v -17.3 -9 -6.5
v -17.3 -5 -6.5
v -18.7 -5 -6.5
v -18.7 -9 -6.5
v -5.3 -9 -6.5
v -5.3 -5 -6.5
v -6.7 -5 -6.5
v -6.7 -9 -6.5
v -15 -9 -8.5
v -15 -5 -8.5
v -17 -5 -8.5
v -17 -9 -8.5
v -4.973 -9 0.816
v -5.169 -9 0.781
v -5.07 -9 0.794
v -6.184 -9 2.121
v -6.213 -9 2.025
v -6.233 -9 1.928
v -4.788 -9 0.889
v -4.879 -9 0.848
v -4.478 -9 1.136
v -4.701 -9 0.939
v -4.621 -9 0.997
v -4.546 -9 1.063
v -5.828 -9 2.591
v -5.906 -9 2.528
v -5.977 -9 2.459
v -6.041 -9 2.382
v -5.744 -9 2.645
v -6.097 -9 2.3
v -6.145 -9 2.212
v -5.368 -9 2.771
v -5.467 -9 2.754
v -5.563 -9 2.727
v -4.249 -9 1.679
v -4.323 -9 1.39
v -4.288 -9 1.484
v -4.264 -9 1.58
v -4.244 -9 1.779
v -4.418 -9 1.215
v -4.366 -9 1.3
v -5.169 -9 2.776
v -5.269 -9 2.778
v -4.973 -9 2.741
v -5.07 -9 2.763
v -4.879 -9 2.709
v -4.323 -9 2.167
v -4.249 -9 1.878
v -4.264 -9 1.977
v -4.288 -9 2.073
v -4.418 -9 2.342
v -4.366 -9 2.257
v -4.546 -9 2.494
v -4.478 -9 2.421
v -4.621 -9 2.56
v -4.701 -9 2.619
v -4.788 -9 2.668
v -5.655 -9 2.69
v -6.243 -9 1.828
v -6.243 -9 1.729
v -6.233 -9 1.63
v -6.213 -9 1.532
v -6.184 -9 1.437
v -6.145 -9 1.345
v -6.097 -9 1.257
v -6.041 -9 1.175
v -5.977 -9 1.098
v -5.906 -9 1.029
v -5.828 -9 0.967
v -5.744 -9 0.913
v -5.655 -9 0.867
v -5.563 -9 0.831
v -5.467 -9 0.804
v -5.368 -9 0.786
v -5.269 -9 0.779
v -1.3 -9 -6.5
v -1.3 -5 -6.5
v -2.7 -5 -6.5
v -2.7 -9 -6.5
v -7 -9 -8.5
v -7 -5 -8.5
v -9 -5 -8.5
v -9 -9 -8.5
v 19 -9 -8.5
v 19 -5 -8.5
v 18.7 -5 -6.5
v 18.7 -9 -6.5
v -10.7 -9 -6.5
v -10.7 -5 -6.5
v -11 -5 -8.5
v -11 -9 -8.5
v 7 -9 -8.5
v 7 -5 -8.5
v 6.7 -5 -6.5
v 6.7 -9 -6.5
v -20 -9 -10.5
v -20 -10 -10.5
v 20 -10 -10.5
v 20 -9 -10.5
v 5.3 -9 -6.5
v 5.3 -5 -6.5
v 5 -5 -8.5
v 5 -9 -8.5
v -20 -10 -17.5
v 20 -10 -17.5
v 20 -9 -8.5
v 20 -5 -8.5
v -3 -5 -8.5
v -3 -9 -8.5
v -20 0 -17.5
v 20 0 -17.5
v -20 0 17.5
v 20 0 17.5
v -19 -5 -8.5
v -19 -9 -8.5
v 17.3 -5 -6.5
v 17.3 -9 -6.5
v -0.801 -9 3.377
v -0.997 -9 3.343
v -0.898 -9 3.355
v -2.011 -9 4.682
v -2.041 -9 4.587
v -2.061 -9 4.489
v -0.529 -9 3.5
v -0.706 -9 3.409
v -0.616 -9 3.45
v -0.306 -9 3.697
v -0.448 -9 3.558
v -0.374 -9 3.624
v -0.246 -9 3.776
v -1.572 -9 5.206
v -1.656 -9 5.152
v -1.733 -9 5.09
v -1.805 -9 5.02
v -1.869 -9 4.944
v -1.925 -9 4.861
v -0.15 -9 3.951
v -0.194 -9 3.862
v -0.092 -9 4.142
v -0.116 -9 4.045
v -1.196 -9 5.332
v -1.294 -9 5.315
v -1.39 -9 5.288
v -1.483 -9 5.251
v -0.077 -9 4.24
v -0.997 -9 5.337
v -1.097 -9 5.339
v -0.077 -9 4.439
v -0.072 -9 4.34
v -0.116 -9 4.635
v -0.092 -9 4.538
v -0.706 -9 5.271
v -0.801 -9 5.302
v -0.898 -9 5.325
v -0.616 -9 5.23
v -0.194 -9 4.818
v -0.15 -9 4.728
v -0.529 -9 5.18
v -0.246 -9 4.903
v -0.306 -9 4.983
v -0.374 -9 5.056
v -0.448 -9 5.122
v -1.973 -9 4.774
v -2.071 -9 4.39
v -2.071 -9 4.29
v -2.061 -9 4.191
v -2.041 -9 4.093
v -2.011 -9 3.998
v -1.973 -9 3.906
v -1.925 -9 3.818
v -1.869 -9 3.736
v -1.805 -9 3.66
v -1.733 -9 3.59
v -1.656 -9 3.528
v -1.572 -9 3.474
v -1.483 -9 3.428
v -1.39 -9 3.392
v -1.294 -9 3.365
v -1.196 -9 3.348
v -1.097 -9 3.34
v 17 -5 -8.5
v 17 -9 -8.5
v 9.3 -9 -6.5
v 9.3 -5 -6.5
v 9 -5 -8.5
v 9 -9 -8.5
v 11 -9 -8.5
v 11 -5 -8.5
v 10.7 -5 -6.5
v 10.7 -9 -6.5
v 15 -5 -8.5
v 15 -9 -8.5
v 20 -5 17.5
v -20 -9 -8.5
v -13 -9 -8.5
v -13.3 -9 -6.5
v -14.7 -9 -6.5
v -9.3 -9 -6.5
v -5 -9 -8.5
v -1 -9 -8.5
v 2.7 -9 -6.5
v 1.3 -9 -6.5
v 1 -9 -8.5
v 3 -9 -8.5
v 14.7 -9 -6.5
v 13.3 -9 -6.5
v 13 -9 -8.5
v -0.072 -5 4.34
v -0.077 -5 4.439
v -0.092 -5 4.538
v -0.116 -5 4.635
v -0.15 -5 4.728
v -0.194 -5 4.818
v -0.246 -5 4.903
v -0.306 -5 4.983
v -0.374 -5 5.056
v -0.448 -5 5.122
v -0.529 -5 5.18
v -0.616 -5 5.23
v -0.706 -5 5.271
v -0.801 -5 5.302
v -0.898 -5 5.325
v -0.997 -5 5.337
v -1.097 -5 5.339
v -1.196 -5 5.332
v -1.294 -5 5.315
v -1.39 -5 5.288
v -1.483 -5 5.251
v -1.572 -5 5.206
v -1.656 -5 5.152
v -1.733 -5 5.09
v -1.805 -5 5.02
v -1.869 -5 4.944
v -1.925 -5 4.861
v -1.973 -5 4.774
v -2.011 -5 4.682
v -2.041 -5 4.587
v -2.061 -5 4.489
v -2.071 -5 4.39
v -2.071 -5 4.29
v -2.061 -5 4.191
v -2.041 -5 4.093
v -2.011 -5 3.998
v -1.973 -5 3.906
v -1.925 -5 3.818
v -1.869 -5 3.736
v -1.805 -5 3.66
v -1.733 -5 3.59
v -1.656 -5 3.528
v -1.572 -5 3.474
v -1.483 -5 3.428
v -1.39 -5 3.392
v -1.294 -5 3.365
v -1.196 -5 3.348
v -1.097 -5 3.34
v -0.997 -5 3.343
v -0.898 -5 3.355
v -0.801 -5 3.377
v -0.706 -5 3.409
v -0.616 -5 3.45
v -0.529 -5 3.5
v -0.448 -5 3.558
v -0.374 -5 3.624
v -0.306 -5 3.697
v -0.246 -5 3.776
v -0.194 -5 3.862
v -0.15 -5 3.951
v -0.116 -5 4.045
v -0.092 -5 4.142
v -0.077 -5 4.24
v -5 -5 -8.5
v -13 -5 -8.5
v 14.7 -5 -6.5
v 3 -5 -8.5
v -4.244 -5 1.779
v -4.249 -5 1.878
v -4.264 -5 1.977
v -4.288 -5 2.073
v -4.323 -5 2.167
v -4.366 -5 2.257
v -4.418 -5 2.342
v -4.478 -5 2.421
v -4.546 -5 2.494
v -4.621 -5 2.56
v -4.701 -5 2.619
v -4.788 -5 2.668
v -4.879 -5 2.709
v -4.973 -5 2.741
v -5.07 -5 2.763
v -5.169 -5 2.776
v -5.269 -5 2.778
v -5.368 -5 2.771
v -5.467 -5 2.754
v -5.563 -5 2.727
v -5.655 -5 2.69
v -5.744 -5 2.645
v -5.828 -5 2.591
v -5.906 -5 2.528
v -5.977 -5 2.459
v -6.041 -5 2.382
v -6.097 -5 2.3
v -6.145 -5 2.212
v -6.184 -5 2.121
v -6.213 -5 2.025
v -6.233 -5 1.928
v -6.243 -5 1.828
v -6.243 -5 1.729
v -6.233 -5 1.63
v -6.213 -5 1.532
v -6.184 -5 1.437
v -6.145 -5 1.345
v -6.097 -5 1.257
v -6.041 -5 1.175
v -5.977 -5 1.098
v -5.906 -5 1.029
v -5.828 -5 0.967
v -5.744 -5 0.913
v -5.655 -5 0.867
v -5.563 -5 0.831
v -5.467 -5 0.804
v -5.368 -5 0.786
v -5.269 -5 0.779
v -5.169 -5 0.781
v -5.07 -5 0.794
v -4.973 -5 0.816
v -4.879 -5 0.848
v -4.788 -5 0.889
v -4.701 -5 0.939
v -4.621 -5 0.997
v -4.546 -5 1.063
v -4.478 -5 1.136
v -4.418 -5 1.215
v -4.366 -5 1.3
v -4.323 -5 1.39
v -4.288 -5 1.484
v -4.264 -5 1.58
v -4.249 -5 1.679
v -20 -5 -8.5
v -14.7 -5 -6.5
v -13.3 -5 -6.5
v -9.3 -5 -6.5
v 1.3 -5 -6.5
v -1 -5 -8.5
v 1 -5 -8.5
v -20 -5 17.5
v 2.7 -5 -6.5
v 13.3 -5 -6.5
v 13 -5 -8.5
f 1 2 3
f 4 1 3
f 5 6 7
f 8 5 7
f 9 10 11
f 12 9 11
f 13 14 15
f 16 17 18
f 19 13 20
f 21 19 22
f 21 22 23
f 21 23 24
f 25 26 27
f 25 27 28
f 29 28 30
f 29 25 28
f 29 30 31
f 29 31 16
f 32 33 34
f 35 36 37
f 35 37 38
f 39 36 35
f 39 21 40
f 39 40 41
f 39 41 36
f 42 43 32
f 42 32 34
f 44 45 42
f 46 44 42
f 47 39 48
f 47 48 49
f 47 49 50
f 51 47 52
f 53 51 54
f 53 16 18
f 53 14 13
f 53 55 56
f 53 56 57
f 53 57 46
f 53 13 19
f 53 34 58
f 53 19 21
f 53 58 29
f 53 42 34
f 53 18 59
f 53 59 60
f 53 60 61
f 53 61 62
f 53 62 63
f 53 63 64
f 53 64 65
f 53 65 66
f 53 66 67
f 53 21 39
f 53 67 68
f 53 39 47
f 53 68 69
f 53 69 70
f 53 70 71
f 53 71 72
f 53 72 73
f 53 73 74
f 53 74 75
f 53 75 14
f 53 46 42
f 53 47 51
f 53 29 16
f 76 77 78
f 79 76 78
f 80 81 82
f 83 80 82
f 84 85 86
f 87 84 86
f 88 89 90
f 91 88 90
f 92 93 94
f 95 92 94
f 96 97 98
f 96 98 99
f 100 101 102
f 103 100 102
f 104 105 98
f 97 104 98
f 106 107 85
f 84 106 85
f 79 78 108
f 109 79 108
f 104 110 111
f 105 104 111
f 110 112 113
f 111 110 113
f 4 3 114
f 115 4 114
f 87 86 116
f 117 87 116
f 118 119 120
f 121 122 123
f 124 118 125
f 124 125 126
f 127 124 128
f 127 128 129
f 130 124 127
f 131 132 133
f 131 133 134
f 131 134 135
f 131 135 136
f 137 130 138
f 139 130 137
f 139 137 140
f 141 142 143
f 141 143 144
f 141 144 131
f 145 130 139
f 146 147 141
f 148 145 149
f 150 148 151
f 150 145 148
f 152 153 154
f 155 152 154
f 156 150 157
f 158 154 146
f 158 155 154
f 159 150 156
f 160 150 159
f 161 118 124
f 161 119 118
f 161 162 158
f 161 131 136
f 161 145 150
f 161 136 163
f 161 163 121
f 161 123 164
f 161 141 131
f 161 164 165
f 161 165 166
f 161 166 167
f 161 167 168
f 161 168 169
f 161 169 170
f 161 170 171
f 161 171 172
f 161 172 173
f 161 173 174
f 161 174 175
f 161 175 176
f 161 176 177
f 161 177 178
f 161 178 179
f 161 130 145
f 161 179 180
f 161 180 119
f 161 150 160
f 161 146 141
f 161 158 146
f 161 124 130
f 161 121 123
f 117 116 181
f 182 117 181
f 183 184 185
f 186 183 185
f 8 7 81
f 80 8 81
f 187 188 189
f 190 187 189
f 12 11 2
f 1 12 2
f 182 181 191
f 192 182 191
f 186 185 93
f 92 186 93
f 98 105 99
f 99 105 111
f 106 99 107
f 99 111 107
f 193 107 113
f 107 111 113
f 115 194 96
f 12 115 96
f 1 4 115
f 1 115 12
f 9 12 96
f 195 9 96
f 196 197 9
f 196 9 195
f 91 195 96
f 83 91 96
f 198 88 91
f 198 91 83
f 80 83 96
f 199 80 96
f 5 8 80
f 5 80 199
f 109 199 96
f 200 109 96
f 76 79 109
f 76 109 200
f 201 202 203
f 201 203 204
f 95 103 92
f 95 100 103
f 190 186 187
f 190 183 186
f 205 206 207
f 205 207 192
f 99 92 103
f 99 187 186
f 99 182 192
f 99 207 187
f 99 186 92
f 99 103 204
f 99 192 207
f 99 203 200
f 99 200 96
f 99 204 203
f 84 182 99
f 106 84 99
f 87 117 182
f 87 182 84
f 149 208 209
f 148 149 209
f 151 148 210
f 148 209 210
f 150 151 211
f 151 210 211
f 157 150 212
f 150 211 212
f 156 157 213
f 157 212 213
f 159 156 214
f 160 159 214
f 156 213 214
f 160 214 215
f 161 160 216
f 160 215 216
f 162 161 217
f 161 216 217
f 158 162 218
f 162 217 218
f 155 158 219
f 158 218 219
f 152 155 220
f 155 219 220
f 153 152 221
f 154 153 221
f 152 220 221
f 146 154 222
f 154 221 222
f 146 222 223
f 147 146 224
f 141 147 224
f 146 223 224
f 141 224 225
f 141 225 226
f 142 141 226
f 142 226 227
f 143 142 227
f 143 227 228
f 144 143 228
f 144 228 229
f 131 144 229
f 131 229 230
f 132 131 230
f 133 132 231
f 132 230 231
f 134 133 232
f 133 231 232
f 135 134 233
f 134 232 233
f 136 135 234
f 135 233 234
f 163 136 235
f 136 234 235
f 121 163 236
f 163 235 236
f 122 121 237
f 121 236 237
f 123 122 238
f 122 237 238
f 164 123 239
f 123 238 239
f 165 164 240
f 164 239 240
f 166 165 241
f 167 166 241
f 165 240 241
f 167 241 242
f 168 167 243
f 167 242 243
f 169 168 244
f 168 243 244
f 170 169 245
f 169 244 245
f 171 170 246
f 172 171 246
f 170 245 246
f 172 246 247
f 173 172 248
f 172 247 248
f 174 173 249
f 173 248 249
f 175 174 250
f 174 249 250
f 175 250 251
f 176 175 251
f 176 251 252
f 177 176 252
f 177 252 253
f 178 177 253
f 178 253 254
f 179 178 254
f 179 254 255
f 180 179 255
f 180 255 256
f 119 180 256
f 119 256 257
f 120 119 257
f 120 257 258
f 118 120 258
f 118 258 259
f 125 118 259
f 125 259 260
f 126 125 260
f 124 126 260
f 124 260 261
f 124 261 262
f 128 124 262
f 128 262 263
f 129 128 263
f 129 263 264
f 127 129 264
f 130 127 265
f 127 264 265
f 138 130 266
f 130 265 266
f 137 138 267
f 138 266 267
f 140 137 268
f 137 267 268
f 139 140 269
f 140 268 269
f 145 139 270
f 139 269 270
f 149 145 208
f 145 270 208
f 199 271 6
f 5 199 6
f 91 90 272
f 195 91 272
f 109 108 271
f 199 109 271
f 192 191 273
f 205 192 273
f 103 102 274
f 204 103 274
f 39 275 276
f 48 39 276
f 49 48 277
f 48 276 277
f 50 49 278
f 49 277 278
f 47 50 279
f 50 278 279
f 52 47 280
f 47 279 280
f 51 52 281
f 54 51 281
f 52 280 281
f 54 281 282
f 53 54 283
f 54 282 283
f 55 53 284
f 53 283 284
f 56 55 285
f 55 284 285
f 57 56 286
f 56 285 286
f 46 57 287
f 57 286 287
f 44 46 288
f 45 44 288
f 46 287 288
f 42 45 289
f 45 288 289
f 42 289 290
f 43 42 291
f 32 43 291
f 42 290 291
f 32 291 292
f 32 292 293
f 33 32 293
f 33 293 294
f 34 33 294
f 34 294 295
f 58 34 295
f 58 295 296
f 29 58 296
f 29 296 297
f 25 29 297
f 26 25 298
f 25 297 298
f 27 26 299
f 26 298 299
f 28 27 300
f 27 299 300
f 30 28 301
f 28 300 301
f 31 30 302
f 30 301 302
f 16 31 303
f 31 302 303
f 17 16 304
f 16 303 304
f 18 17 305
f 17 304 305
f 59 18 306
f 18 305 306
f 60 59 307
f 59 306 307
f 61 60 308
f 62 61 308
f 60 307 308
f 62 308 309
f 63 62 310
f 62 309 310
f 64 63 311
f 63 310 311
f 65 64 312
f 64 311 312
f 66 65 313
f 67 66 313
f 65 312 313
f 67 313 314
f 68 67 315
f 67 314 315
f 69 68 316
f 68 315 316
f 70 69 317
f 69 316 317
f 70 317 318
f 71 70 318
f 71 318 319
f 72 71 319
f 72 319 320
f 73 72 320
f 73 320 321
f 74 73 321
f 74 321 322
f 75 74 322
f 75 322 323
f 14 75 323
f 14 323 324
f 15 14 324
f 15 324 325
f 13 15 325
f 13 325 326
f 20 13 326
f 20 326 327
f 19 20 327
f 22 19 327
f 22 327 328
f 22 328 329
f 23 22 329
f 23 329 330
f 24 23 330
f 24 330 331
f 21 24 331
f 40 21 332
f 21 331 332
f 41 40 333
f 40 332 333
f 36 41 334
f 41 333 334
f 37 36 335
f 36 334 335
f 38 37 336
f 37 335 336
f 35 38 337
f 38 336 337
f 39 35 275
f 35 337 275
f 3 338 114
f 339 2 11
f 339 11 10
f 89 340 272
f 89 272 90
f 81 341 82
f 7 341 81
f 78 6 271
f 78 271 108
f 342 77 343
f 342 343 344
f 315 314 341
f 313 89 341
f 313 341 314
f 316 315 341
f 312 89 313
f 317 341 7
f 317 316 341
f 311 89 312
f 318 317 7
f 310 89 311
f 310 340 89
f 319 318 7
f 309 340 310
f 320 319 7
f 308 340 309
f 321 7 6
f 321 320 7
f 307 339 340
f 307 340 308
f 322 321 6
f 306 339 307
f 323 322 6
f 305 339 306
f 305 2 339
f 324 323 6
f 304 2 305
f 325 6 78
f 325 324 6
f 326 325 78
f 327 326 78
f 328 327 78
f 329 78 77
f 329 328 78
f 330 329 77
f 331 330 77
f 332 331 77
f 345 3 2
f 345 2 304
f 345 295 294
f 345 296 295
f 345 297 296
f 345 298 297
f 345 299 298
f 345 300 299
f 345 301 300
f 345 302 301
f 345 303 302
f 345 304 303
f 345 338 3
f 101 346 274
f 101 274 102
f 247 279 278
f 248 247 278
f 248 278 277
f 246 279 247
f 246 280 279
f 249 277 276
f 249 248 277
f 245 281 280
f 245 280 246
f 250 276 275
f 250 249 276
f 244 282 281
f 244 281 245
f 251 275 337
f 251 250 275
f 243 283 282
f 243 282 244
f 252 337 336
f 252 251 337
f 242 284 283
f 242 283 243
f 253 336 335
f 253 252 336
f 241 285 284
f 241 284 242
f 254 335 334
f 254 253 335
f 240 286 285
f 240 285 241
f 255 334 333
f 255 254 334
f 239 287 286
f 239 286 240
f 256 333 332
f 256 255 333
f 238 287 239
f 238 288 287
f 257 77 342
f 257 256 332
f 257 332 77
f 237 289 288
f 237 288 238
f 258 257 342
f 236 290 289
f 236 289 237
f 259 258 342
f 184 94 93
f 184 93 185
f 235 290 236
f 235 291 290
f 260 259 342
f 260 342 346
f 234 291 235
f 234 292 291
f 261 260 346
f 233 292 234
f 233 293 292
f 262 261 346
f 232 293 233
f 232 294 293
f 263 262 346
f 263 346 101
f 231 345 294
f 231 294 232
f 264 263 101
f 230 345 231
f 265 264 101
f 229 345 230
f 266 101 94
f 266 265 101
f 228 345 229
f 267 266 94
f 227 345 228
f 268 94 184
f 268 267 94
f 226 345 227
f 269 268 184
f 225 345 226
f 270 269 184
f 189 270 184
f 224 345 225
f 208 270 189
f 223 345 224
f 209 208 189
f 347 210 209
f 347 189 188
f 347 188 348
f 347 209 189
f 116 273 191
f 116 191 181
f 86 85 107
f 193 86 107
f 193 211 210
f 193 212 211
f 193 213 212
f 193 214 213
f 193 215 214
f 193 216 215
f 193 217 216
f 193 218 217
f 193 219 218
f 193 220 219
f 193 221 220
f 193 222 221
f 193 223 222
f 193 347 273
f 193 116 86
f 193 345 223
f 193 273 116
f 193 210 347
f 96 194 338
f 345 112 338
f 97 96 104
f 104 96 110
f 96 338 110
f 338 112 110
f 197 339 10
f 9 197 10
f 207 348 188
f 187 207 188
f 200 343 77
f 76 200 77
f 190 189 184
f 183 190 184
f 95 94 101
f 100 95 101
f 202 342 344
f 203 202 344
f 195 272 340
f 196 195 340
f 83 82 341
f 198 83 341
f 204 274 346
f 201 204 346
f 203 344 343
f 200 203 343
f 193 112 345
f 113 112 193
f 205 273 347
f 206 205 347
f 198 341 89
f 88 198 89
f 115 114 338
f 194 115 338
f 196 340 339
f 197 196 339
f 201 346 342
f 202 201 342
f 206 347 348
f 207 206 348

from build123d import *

# Parameters (mm, degrees)
F0_W     = 40
F0_H     = 35
F1_DEPTH = 10
F2_W     = 40
F2_H     = 30
F3_DEPTH = 5
F4_W     = 1
F4_H     = 2
F5_DEPTH = 40
F6_R     = 1
F7_DEPTH = 4
F9_DEPTH = 4


with BuildPart() as f1:
    # F0 (on Front) → F1 (new body)
    with BuildSketch(Plane.XZ):
        Rectangle(F0_W, F0_H)
    extrude(amount=F1_DEPTH)

    # F2 (on face) → F3 (cut)
    with BuildSketch(Plane.XZ.offset(10)):
        with Locations((0, 2.5)):
            Rectangle(F2_W, F2_H)
    extrude(amount=-F3_DEPTH, mode=Mode.SUBTRACT)

    # F4 (on face) → F5 (join, through all)
    with BuildSketch(Plane.YZ.offset(20)):
        with Locations((-9.5, -11.5)):
            Rectangle(F4_W, F4_H)
    extrude(amount=-F5_DEPTH)

    # F6 (on face) → F7 (join)
    with BuildSketch(Plane.XZ.offset(5)):
        with Locations((-1.07176, 4.339809)):
            Circle(F6_R)
        with Locations((-5.244032, 1.778612)):
            Circle(F6_R)
    extrude(amount=F7_DEPTH)

    # F8 (on face) → F9 (join)
    with BuildSketch(Plane.XZ.offset(5)):
        Polygon((-20, -12.5), (20, -12.5), (20, -8.5), (19, -8.5), (17, -8.5), (15, -8.5), (13, -8.5), (11, -8.5), (9, -8.5), (7, -8.5), (5, -8.5), (3, -8.5), (1, -8.5), (-1, -8.5), (-3, -8.5), (-5, -8.5), (-7, -8.5), (-9, -8.5), (-11, -8.5), (-13, -8.5), (-15, -8.5), (-17, -8.5), (-19, -8.5), (-20, -8.5), align=None)
        Polygon((17, -8.5), (19, -8.5), (18.7, -6.5), (18, -6.5), (17.3, -6.5), align=None)
        Polygon((-18.7, -6.5), (-19, -8.5), (-17, -8.5), (-17.3, -6.5), (-18, -6.5), align=None)
        Polygon((13, -8.5), (15, -8.5), (14.7, -6.5), (14, -6.5), (13.3, -6.5), align=None)
        Polygon((-14.7, -6.5), (-15, -8.5), (-13, -8.5), (-13.3, -6.5), (-14, -6.5), align=None)
        Polygon((9, -8.5), (11, -8.5), (10.7, -6.5), (10, -6.5), (9.3, -6.5), align=None)
        Polygon((-10.7, -6.5), (-11, -8.5), (-9, -8.5), (-9.3, -6.5), (-10, -6.5), align=None)
        Polygon((5, -8.5), (7, -8.5), (6.7, -6.5), (6, -6.5), (5.3, -6.5), align=None)
        Polygon((-6.7, -6.5), (-7, -8.5), (-5, -8.5), (-5.3, -6.5), (-6, -6.5), align=None)
        Polygon((1, -8.5), (3, -8.5), (2.7, -6.5), (2, -6.5), (1.3, -6.5), align=None)
        Polygon((-2.7, -6.5), (-3, -8.5), (-1, -8.5), (-1.3, -6.5), (-2, -6.5), align=None)
    extrude(amount=F9_DEPTH)


with BuildPart() as f10_1:
    # F10: copy of F1
    add(f1.part)


solid = f10_1.part
